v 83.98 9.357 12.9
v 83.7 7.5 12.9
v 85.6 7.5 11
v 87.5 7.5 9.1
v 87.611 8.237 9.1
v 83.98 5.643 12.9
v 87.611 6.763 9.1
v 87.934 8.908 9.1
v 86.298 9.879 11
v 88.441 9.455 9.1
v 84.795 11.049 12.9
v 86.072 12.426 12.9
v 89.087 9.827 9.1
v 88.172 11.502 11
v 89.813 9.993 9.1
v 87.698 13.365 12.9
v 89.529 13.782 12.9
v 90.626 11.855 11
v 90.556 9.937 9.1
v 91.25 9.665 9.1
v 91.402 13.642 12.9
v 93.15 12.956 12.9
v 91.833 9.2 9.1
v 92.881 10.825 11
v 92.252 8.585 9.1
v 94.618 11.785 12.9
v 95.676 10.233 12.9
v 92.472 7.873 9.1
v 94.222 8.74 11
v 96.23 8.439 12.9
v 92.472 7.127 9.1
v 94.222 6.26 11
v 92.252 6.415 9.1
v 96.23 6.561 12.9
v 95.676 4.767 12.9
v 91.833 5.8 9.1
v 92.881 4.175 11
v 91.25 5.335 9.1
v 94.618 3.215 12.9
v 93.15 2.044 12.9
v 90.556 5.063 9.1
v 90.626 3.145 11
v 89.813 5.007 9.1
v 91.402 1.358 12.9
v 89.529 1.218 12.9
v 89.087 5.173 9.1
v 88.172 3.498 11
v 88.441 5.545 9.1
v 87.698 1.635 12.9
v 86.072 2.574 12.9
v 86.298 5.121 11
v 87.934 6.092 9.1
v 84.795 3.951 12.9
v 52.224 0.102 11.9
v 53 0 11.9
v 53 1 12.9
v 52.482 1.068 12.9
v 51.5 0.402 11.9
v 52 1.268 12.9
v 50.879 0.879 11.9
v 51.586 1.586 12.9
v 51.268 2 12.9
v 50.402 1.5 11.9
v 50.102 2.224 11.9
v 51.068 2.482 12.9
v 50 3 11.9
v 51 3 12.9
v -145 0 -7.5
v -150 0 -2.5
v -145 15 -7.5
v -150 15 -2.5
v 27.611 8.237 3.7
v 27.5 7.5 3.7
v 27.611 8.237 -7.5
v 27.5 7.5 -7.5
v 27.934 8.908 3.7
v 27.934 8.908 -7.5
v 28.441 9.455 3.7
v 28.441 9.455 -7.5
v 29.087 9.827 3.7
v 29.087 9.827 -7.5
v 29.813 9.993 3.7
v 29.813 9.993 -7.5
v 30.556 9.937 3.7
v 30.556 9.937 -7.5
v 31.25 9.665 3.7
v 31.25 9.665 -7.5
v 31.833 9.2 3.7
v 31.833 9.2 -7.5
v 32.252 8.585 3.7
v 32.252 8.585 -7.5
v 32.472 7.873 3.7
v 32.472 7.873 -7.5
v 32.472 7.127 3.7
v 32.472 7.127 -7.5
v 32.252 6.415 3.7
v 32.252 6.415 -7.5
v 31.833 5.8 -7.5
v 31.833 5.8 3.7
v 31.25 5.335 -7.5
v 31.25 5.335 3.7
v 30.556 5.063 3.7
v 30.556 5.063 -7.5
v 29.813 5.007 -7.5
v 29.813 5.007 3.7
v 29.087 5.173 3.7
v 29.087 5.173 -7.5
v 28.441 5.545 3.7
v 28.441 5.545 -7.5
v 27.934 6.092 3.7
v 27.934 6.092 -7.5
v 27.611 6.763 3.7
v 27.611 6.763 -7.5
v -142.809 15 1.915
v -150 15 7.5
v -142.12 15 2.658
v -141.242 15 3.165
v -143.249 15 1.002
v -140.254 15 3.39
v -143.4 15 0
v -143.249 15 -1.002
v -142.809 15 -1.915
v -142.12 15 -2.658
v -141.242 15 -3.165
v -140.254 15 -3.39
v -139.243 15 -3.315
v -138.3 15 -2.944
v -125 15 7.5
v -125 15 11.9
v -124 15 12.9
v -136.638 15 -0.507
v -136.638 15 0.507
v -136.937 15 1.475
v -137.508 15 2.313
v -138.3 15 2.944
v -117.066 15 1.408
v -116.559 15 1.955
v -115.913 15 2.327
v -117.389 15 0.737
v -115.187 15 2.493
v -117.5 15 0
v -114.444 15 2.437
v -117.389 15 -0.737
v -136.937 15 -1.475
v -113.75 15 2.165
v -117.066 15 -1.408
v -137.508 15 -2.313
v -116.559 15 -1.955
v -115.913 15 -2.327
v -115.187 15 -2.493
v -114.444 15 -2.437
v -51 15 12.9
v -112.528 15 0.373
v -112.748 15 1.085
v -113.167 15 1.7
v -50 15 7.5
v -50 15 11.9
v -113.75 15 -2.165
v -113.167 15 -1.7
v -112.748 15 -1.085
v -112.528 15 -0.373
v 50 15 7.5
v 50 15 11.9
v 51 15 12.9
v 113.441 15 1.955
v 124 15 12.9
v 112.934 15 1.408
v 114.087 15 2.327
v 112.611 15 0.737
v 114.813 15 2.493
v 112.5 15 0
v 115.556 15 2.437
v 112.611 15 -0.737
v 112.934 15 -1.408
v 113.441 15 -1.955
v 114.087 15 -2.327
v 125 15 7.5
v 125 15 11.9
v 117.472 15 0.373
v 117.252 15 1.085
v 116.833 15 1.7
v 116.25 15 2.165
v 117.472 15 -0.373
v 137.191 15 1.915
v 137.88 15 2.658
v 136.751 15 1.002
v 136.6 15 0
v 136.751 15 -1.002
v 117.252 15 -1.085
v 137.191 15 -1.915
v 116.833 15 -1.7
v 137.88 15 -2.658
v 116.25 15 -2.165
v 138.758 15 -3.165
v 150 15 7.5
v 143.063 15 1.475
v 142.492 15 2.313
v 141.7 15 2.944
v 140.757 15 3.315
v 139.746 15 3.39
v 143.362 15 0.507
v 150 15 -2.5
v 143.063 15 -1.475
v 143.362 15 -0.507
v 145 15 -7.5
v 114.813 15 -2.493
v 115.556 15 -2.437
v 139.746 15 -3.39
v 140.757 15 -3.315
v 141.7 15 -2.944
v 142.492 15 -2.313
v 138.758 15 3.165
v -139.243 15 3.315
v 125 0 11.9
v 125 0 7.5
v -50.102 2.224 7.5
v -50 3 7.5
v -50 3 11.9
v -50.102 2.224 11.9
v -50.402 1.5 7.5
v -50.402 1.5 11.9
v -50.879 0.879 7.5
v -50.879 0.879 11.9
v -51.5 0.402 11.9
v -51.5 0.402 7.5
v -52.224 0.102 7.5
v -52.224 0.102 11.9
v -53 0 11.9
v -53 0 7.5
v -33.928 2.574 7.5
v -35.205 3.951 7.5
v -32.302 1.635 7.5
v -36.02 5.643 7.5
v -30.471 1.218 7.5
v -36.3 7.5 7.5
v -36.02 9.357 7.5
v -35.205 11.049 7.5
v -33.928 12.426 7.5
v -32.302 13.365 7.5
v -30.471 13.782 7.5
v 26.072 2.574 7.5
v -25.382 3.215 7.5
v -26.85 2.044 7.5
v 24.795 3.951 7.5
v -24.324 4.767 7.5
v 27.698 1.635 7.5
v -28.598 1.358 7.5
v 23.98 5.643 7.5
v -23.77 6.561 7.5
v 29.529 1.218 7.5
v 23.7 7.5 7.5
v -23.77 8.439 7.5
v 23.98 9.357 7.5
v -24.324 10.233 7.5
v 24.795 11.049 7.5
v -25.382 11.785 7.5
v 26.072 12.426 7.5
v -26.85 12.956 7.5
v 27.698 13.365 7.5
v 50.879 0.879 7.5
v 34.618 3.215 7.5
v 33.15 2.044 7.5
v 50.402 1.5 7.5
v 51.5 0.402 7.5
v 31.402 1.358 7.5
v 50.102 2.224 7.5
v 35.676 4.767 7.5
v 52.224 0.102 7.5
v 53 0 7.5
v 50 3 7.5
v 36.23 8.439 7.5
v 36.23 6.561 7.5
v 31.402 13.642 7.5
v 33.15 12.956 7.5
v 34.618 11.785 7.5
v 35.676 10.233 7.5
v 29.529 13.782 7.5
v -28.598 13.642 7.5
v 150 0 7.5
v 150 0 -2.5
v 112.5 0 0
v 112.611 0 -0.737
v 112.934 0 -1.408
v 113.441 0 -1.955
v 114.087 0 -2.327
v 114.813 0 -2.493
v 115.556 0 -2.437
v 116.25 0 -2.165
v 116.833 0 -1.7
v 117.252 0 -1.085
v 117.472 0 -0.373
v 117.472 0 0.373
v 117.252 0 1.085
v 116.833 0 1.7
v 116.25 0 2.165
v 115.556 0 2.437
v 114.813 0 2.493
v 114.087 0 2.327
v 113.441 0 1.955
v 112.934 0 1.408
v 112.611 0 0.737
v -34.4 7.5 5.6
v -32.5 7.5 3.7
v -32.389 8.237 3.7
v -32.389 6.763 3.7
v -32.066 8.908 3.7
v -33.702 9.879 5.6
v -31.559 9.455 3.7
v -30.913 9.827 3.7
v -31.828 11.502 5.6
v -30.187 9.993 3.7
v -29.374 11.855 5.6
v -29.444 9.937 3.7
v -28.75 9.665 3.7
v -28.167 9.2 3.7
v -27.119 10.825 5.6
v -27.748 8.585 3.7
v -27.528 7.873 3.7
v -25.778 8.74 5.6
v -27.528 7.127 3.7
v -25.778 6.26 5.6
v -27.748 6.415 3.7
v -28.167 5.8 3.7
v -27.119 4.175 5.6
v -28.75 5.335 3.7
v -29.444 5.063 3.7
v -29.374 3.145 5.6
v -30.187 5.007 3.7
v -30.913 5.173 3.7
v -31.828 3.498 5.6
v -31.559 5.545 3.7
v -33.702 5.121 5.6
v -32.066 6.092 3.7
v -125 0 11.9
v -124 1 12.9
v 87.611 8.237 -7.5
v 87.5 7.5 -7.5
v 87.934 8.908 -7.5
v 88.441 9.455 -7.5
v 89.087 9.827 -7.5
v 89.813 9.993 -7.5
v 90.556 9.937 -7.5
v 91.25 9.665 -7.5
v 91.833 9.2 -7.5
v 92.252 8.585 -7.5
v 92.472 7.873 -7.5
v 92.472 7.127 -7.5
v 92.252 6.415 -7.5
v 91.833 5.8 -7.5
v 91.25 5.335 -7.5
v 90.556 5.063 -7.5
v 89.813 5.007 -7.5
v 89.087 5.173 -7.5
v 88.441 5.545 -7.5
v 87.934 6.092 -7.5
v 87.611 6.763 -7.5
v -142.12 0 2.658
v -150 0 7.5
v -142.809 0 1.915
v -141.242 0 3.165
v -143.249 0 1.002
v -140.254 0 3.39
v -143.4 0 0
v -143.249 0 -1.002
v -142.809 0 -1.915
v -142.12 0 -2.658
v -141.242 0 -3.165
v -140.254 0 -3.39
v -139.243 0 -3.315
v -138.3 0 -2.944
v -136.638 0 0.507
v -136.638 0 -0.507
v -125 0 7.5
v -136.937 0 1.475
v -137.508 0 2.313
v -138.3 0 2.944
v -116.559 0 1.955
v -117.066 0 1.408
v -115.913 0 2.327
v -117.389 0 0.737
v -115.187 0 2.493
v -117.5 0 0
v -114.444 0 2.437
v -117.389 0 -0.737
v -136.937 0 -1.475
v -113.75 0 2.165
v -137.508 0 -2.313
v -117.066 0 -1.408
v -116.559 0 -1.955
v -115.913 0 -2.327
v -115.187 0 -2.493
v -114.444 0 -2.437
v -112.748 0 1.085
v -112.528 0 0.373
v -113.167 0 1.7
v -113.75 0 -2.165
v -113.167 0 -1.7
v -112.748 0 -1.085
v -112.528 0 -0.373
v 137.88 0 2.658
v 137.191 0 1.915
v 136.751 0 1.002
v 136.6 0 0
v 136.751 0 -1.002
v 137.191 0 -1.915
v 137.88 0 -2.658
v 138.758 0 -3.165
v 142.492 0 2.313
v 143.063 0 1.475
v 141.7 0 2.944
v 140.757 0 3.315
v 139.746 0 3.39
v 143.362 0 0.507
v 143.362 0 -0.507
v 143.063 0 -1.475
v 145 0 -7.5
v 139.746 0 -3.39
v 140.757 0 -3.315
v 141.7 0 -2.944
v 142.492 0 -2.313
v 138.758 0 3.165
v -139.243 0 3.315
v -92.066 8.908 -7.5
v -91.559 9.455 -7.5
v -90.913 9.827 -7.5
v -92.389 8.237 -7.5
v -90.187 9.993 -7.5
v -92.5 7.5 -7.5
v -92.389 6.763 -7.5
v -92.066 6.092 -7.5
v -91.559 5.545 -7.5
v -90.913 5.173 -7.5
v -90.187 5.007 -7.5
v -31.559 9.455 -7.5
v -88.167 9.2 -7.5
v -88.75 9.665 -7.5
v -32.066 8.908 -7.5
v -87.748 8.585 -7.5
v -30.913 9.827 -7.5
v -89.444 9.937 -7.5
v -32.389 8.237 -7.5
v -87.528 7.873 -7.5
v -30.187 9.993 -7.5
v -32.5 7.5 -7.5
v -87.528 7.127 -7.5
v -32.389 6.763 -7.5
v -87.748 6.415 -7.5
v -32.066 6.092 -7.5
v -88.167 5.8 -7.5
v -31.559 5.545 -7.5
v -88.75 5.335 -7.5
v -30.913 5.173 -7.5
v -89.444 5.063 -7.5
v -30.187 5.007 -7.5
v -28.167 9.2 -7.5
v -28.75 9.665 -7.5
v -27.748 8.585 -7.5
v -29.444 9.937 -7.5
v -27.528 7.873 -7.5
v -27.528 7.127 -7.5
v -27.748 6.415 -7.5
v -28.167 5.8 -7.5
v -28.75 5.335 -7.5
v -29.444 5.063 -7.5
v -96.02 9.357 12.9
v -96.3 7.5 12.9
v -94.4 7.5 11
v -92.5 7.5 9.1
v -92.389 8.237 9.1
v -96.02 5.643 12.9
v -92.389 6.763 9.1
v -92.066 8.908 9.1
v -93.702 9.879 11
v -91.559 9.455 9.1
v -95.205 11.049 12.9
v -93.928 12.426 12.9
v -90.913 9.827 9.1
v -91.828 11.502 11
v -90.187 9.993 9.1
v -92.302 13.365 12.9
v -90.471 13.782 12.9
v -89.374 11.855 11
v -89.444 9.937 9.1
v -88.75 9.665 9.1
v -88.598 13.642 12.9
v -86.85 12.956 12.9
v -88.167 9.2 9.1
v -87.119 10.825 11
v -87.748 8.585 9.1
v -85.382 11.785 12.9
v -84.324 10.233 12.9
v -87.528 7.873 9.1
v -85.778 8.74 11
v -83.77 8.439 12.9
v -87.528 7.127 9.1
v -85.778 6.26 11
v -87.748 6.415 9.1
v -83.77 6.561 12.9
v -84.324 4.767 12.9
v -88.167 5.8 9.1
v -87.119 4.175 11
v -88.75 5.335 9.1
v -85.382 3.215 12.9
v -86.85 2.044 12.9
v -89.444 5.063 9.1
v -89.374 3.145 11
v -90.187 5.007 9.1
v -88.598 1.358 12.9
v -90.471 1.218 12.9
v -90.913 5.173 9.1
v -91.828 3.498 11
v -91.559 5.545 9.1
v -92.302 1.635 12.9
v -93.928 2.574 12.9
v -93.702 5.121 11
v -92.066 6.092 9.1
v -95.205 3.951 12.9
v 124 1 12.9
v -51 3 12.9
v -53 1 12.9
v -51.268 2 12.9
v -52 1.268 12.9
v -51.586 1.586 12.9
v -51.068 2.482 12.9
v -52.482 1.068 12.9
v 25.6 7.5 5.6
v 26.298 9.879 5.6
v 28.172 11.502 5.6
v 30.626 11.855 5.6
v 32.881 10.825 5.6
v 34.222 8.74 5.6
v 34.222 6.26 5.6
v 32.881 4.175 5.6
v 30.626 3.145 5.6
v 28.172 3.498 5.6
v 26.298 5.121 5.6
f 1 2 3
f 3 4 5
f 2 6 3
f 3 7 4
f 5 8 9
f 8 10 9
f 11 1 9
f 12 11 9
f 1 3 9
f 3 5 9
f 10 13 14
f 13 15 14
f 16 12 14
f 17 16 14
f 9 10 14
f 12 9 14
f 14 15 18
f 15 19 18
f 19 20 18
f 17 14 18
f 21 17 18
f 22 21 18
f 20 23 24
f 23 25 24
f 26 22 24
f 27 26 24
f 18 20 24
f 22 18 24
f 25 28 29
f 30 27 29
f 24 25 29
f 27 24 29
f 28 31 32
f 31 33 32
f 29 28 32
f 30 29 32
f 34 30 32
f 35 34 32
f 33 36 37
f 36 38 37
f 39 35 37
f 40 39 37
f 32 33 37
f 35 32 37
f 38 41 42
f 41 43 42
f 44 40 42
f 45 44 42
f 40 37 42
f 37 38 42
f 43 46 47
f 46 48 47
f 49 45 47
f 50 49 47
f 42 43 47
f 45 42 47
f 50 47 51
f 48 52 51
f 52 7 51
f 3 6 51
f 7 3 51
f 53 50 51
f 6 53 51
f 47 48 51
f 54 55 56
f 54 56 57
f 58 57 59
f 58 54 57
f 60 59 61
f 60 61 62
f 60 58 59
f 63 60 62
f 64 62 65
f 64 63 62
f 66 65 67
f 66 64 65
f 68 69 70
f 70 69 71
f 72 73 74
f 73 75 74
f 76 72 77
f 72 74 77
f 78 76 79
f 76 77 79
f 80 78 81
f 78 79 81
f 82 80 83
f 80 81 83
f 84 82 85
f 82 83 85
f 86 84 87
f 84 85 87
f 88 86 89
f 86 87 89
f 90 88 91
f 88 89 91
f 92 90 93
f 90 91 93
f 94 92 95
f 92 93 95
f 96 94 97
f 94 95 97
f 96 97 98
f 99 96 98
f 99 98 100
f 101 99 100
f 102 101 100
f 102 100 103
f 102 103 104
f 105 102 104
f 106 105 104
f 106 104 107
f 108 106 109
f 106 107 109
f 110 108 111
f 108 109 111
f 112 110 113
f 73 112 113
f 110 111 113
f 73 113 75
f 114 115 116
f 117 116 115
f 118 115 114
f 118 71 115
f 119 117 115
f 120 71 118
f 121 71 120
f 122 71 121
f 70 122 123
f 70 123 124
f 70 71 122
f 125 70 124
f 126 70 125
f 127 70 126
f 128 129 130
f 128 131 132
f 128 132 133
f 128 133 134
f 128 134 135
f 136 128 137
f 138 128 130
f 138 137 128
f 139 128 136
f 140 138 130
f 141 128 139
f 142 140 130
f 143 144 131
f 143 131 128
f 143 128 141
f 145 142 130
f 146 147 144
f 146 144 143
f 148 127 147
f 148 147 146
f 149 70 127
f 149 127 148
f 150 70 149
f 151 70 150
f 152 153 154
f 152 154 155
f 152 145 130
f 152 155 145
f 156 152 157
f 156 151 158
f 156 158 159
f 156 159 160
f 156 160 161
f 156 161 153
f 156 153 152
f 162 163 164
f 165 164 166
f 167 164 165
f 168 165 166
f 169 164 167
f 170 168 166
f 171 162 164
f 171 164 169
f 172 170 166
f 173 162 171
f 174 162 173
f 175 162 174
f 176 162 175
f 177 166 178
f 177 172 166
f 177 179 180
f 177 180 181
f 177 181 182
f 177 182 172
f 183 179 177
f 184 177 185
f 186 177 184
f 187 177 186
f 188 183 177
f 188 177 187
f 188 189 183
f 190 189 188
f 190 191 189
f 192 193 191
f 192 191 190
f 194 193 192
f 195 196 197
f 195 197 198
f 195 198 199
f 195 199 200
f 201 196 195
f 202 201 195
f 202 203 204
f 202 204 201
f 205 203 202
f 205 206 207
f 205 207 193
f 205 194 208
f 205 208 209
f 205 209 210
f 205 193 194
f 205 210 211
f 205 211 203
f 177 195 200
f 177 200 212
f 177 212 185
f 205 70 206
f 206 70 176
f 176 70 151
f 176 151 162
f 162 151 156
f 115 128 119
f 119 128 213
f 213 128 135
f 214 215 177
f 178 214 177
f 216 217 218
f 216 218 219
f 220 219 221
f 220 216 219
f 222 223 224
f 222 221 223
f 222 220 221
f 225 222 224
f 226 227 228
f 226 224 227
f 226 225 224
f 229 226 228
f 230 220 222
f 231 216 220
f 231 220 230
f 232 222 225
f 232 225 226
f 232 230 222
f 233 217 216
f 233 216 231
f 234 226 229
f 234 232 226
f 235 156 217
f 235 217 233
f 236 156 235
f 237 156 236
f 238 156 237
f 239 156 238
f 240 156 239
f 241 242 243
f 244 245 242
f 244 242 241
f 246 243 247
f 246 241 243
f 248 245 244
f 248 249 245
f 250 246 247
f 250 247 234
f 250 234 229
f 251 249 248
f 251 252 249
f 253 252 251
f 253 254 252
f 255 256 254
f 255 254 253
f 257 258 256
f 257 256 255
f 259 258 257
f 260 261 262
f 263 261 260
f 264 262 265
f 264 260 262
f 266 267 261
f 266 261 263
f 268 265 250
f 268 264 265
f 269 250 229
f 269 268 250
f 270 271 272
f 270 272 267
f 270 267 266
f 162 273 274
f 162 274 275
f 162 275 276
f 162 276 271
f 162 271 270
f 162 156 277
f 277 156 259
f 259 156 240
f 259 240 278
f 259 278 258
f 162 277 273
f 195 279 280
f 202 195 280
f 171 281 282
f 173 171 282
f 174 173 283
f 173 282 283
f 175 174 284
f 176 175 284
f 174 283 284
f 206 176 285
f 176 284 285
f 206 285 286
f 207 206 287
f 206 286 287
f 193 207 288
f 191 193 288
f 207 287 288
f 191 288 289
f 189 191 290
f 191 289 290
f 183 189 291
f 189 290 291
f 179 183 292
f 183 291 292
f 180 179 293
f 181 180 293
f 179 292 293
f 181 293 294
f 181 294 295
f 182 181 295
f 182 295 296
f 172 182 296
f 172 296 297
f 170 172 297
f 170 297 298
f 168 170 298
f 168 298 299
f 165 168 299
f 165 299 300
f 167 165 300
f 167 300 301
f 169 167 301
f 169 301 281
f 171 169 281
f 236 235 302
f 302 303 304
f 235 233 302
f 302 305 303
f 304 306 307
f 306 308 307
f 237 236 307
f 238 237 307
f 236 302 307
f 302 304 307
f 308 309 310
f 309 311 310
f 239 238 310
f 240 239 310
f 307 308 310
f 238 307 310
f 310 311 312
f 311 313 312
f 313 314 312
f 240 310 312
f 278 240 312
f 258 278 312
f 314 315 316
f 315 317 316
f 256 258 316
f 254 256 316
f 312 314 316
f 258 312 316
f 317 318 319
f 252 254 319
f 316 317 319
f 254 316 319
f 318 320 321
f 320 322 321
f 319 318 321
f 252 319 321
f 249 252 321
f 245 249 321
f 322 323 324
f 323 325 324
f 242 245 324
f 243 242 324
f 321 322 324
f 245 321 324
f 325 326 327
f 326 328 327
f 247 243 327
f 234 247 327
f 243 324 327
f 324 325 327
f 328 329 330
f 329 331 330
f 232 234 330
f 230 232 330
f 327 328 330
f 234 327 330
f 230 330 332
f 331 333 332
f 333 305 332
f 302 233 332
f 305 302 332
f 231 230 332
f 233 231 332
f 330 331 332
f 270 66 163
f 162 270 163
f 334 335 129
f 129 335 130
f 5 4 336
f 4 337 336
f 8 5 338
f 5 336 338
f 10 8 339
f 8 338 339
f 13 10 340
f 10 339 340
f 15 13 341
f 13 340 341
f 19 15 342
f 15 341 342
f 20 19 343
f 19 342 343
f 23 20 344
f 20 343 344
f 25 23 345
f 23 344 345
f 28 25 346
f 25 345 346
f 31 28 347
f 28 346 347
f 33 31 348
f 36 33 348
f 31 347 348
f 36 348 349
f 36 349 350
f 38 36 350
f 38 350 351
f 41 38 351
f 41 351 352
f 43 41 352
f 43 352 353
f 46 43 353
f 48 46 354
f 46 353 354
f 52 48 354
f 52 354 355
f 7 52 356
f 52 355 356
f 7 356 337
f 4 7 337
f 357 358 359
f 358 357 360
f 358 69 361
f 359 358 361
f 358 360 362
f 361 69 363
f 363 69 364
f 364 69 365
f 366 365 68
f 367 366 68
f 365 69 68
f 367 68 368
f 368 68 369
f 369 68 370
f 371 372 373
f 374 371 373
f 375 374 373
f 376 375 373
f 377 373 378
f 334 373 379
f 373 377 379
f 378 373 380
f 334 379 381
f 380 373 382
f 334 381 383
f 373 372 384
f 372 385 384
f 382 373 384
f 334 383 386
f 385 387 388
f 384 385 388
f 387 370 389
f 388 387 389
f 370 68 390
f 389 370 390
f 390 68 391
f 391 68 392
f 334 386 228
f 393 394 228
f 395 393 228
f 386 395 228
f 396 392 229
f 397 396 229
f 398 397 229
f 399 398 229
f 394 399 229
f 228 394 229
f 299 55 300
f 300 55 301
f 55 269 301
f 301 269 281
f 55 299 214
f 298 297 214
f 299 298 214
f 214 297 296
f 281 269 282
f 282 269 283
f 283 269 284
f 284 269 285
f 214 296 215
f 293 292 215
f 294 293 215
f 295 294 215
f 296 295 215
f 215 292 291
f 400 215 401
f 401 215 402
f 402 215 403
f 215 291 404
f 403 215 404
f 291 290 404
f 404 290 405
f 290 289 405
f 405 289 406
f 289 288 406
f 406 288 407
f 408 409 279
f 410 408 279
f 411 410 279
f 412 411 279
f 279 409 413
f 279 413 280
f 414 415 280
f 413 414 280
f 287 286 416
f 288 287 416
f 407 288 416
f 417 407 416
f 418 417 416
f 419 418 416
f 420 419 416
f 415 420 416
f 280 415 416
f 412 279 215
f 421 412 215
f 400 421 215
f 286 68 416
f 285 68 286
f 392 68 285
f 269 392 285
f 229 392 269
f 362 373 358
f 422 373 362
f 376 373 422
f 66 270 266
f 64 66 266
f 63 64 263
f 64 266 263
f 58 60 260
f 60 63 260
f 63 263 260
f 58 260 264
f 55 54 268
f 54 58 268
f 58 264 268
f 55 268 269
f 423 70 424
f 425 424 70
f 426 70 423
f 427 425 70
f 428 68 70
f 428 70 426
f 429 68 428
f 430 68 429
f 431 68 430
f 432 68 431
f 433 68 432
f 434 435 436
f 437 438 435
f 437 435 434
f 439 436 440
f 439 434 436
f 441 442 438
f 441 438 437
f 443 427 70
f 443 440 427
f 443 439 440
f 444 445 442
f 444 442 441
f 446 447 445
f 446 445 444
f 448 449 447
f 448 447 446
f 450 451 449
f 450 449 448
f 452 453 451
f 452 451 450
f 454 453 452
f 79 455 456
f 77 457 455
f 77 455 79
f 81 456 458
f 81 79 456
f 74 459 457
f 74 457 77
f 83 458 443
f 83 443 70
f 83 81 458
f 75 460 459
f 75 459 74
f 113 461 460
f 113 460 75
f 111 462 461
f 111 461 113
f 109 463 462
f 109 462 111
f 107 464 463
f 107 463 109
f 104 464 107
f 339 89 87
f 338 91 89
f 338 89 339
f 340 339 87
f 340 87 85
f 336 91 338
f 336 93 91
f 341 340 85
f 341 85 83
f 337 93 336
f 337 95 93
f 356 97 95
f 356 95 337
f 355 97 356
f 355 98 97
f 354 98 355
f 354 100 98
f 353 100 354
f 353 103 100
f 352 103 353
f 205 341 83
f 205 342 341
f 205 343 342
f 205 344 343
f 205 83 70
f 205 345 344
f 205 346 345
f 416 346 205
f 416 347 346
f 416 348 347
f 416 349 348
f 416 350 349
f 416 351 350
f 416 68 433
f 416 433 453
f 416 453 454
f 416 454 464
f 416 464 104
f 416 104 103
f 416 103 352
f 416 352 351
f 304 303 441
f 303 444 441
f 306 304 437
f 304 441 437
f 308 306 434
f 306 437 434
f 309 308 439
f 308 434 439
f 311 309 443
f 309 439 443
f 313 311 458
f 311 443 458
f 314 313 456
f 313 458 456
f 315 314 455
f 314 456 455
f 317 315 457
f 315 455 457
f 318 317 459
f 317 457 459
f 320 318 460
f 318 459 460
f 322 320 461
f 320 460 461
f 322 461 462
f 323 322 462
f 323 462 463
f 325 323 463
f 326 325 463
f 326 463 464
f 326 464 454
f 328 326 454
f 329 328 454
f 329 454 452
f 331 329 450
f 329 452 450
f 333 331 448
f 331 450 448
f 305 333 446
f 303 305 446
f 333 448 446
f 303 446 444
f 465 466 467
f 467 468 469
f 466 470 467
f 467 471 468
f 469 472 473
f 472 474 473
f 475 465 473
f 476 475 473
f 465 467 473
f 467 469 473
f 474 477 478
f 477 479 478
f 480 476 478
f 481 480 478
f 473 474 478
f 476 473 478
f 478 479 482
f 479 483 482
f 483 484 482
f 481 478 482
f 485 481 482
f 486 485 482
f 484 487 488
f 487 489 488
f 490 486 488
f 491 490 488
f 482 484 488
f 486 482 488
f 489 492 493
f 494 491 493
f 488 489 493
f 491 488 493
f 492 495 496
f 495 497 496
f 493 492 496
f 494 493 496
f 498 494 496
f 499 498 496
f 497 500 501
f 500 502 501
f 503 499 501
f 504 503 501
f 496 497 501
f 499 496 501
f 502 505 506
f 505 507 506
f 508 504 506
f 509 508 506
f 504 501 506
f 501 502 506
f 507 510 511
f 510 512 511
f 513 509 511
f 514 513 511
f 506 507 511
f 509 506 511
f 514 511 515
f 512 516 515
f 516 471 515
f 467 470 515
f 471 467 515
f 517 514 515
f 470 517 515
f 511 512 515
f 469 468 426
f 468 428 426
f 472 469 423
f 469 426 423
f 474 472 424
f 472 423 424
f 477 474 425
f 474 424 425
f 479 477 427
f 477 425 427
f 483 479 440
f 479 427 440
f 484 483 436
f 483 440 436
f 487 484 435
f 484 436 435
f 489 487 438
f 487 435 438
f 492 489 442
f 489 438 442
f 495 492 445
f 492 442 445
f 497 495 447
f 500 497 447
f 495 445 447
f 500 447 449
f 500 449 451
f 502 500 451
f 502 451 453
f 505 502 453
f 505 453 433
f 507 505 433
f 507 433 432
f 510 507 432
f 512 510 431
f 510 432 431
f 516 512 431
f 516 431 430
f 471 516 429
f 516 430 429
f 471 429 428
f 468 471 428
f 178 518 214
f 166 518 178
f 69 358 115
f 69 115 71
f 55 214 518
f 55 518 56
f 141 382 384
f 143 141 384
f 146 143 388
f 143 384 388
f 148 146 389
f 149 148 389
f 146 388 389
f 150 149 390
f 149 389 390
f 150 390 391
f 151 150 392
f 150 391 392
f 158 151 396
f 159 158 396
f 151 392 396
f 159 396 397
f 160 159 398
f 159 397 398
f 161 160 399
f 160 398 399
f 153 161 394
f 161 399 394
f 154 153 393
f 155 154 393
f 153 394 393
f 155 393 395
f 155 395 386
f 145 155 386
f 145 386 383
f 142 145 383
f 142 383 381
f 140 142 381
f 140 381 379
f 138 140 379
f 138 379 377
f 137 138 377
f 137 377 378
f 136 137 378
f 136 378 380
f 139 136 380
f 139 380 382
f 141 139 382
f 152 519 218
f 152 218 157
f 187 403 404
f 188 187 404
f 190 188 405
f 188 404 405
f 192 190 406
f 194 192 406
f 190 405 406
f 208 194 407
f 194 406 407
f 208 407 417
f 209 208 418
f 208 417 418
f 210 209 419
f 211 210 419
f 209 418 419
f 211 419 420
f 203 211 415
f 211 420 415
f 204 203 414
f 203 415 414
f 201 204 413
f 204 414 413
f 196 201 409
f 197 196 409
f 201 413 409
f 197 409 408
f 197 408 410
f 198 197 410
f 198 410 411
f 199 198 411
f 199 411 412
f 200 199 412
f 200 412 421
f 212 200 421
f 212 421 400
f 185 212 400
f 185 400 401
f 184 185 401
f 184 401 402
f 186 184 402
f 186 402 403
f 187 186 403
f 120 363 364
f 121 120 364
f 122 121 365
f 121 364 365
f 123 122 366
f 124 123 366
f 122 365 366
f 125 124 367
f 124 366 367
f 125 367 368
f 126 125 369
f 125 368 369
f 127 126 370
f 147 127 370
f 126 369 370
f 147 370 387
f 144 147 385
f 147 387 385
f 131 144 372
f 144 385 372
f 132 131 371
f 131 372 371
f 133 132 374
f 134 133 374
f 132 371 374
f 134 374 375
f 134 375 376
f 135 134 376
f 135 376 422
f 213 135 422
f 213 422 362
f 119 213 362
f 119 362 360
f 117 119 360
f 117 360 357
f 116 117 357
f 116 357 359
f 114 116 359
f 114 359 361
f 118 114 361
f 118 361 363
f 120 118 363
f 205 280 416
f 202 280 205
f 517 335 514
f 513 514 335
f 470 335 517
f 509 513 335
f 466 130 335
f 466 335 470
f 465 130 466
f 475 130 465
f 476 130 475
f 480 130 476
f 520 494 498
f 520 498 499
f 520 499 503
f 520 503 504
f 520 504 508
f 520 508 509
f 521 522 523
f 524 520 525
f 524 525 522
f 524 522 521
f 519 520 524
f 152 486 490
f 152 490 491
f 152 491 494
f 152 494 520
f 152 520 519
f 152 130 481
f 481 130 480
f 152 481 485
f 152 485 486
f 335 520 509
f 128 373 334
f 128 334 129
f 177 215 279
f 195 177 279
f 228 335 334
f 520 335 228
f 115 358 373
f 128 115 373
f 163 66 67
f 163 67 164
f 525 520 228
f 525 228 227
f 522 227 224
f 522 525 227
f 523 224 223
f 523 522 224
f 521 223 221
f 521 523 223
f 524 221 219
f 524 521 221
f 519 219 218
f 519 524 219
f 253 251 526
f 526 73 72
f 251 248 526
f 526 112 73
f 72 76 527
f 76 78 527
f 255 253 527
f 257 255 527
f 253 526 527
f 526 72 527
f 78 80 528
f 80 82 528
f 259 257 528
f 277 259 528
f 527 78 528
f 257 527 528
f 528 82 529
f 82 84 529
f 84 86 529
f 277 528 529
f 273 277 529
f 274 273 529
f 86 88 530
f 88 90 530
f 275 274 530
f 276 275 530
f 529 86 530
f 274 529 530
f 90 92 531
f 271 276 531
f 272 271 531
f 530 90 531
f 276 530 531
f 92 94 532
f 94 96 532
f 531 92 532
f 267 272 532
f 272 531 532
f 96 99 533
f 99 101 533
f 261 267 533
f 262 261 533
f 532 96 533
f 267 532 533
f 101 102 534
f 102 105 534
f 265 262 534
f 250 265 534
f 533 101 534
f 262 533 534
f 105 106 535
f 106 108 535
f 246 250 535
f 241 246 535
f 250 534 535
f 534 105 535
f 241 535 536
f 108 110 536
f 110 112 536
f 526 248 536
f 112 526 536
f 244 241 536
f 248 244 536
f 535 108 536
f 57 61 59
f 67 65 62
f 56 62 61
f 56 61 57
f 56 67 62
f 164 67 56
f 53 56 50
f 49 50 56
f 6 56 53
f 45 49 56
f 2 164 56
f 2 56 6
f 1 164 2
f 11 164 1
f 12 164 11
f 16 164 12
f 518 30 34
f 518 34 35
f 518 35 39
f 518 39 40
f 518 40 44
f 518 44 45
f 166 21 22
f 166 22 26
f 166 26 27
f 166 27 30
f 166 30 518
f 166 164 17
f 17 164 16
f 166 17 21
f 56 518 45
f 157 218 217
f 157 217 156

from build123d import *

# Parameters (mm, degrees)
SKETCH_1_W                   = 300
SKETCH_1_H                   = 15
EXTRUDE_345_DEPTH            = 15
HOLE_WIZARD_M6_D             = 5
HOLE_WIZARD_M8_D             = 6.8
SKETCH_8_W                   = 250
SKETCH_8_H                   = 15
EXTRUDE_2518_DEPTH           = 5.4
SKETCH_10_W                  = 100
SKETCH_10_H                  = 15
CUT_EXTRUDE_2855_DEPTH       = 5.4
HOLE_WIZARD_1_M6_D           = 5
HOLE_WIZARD_1_M6_CSINK_D     = 12.6
HOLE_WIZARD_1_M6_CSINK_ANGLE = 90
HOLE_WIZARD_2_M6_D           = 5
HOLE_WIZARD_2_M6_CSINK_D     = 12.6
HOLE_WIZARD_2_M6_CSINK_ANGLE = 90
FILLET_1_R                   = 3
CHAMFER_1_SIZE               = 5
CHAMFER_2_SIZE               = 1


with BuildPart() as part:
    # Эскиз1 → Extrude 345 (new body)
    with BuildSketch(Plane(origin=(0, 0, 0), x_dir=(1, 0, 0), z_dir=(0, 1, 0))):
        Rectangle(SKETCH_1_W, SKETCH_1_H)
    extrude(amount=EXTRUDE_345_DEPTH)

    # Крепление шарнира M6 (through all)
    with Locations(Plane(origin=(0, 15, 0), x_dir=(1, 0, 0), z_dir=(0, 1, 0))):
        with Locations((-115, 0), (115, 0)):
            Hole(HOLE_WIZARD_M6_D / 2)

    # Шпилька-M8 (through all)
    with Locations(Plane(origin=(0, 15, 0), x_dir=(1, 0, 0), z_dir=(0, 1, 0))):
        with Locations((-140, 0), (140, 0)):
            Hole(HOLE_WIZARD_M8_D / 2)

    # Эскиз8 → Extrude 2518 (add)
    with BuildSketch(Plane.XY.offset(7.5)):
        with Locations((0, 7.5)):
            Rectangle(SKETCH_8_W, SKETCH_8_H)
    extrude(amount=EXTRUDE_2518_DEPTH)

    # Эскиз10 → Cut-Extrude 2855 (cut)
    with BuildSketch(Plane.XY.offset(12.9)):
        with Locations((0, 7.5)):
            Rectangle(SKETCH_10_W, SKETCH_10_H)
    extrude(amount=-CUT_EXTRUDE_2855_DEPTH, mode=Mode.SUBTRACT)

    # Прижим-1-M6 (through all)
    with Locations(Plane.XY.offset(12.9)):
        with Locations((-90, 7.5), (90, 7.5)):
            CounterSinkHole(HOLE_WIZARD_1_M6_D / 2, HOLE_WIZARD_1_M6_CSINK_D / 2, counter_sink_angle=HOLE_WIZARD_1_M6_CSINK_ANGLE)

    # Прижим-2-M6 (through all)
    with Locations(Plane.XY.offset(7.5)):
        with Locations((-30, 7.5), (30, 7.5)):
            CounterSinkHole(HOLE_WIZARD_2_M6_D / 2, HOLE_WIZARD_2_M6_CSINK_D / 2, counter_sink_angle=HOLE_WIZARD_2_M6_CSINK_ANGLE)

    # Скругление1
    fillet_1_edges = [part.edges().sort_by_distance(p)[0] for p in [
        (-50, 0, 10.2),
        (50, 0, 10.2),
    ]]
    fillet(fillet_1_edges, radius=FILLET_1_R)

    # Фаска1
    chamfer_1_edges = [part.edges().sort_by_distance(p)[0] for p in [
        (-150, 7.5, -7.5),
        (150, 7.5, -7.5),
    ]]
    chamfer(chamfer_1_edges, length=CHAMFER_1_SIZE)

    # Фаска2
    chamfer_2_edges = [part.edges().sort_by_distance(p)[0] for p in [
        (-125, 7.5, 12.9),
        (-89, 0, 12.9),
        (125, 7.5, 12.9),
        (-50, 9, 12.9),
        (50, 9, 12.9),
        (89, 0, 12.9),
        (50.878679656, 0.878679656, 12.9),
        (-50.878679656, 0.878679656, 12.9),
    ]]
    chamfer(chamfer_2_edges, length=CHAMFER_2_SIZE)


solid = part.part
